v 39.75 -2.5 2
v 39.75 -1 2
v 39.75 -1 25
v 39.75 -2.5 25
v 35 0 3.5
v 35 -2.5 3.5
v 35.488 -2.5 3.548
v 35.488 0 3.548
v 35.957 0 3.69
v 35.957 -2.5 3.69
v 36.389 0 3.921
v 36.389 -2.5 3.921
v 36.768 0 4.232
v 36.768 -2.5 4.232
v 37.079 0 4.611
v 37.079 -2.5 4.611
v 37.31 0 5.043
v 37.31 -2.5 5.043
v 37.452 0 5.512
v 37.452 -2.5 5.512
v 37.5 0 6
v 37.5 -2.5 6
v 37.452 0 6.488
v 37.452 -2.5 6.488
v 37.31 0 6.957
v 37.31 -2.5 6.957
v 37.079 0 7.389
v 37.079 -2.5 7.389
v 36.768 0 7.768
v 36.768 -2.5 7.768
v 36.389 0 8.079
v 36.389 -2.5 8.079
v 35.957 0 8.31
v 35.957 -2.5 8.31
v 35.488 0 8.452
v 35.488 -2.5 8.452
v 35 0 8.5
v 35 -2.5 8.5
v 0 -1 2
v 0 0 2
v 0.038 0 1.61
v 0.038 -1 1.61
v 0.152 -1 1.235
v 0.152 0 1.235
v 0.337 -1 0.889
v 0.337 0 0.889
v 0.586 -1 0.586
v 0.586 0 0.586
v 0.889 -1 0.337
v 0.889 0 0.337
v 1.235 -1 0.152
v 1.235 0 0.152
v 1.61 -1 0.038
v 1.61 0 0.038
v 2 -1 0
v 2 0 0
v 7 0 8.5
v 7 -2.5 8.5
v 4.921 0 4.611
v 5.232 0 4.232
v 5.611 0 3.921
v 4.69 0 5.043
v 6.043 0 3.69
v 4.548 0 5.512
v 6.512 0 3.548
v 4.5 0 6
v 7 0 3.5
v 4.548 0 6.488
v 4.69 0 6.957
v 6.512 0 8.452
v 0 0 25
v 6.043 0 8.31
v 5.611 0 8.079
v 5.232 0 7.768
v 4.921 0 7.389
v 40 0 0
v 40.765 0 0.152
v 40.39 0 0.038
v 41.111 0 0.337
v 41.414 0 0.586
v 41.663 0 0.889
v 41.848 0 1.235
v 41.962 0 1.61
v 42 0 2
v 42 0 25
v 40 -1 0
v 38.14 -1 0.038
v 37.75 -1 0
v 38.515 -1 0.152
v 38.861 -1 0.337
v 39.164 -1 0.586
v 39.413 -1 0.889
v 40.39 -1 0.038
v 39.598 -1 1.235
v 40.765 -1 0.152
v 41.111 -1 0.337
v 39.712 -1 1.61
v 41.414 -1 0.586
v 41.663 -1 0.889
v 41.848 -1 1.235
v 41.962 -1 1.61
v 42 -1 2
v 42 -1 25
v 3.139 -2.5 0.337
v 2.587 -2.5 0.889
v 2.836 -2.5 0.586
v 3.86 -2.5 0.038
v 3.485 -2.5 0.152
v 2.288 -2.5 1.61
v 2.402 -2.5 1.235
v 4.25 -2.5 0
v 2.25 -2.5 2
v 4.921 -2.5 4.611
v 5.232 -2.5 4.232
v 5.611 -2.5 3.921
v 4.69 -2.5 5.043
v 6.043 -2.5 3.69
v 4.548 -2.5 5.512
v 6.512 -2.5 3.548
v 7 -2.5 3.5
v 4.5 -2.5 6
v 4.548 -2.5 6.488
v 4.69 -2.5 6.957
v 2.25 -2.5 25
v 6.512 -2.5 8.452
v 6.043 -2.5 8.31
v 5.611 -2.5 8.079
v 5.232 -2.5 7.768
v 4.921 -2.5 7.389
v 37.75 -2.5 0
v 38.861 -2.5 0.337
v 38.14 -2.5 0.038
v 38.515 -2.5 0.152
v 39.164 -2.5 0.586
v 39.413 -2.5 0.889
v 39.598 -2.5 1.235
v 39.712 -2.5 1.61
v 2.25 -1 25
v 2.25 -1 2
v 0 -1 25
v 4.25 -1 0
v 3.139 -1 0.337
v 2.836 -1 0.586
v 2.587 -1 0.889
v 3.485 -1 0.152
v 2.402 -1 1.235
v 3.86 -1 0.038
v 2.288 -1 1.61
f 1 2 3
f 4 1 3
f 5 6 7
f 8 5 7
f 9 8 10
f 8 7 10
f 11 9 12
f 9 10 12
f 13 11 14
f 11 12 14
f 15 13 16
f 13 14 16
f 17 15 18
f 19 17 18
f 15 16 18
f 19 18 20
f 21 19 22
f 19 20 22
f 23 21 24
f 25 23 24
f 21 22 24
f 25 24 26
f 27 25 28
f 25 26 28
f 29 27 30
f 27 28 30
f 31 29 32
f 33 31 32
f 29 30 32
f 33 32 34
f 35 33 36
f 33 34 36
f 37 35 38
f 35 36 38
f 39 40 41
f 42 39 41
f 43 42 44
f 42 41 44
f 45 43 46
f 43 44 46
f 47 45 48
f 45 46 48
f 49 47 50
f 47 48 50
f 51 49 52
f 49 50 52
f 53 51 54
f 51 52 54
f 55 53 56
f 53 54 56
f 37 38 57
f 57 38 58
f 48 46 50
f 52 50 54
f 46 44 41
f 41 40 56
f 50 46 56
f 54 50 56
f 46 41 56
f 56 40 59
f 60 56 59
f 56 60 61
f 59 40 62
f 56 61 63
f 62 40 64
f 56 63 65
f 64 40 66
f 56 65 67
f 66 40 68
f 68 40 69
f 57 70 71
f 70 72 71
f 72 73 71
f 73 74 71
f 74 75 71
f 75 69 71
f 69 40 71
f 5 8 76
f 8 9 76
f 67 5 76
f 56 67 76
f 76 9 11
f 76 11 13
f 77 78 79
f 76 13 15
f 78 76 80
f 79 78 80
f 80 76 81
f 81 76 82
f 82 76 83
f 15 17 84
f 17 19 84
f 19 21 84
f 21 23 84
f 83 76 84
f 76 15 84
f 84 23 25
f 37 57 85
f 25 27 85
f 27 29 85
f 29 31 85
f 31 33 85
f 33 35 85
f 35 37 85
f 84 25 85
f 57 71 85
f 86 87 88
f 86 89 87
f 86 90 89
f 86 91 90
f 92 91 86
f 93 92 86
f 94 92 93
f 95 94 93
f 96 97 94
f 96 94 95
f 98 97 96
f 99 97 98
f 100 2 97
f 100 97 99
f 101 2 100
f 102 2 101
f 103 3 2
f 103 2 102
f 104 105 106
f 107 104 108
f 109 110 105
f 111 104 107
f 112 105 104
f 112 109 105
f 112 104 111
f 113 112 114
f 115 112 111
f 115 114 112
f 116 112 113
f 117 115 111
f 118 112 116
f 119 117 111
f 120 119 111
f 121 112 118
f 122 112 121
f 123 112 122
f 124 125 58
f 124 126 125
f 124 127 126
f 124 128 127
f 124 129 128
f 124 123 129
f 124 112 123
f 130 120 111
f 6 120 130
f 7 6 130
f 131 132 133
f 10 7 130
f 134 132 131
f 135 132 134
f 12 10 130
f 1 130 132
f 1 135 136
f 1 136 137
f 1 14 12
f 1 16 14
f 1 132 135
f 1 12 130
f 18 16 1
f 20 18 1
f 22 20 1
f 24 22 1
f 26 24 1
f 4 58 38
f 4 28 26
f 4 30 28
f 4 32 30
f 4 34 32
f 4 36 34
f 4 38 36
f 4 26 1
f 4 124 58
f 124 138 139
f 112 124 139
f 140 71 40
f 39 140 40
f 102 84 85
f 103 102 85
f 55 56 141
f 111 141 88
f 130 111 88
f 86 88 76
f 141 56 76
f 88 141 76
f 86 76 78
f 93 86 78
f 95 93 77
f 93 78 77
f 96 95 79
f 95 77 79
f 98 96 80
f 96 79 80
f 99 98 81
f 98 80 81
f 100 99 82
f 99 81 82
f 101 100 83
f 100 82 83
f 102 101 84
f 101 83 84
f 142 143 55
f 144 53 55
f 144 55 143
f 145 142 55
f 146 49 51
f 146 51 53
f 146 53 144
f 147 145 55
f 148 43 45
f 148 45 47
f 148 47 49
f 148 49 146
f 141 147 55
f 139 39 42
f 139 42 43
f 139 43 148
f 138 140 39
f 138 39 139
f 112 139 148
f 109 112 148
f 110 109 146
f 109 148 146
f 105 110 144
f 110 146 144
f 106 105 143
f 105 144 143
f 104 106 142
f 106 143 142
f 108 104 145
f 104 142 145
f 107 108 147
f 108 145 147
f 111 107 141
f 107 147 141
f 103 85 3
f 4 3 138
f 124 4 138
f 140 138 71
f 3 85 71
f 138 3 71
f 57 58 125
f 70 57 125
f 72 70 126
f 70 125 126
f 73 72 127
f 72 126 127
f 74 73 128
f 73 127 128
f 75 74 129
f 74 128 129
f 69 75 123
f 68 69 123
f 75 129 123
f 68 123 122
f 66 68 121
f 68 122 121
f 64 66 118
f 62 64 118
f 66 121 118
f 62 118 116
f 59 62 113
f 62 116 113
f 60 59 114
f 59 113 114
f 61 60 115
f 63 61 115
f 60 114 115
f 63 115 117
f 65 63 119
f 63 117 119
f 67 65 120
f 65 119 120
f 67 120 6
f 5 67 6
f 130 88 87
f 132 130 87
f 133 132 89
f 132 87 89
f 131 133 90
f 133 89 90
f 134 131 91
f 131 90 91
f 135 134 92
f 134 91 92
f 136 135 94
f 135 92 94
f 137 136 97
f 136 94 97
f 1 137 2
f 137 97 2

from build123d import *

# Parameters (mm, degrees)
F1_DEPTH = 1
F3_DEPTH = 1.5
F5_DEPTH = 2.5


with BuildPart() as f1:
    # F0 (on Front) → F1 (new body)
    with BuildSketch(Plane.XZ):
        with BuildLine():
            ThreePointArc((0, 2), (0.5857864376, 0.5857864376), (2, 0))
            Line((2, 0), (40, 0))
            ThreePointArc((40, 0), (41.4142135624, 0.5857864376), (42, 2))
            Line((42, 2), (42, 25))
            Line((42, 25), (0, 25))
            Line((0, 25), (0, 2))
        make_face()
    extrude(amount=F1_DEPTH)

    # F2 (on face) → F3 (join)
    with BuildSketch(Plane.XZ.offset(1)):
        with BuildLine():
            Line((39.75, 25), (2.25, 25))
            Line((2.25, 25), (2.25, 2))
            ThreePointArc((2.25, 2), (2.8357864376, 0.5857864376), (4.25, 0))
            Line((4.25, 0), (37.75, 0))
            ThreePointArc((37.75, 0), (39.1642135624, 0.5857864376), (39.75, 2))
            Line((39.75, 2), (39.75, 25))
        make_face()
    extrude(amount=F3_DEPTH)

    # F4 (on face) → F5 (cut, through all)
    with BuildSketch(Plane.XZ.offset(2.5)):
        with BuildLine():
            Line((35, 8.5), (7, 8.5))
            ThreePointArc((7, 8.5), (4.5, 6), (7, 3.5))
            Line((7, 3.5), (35, 3.5))
            ThreePointArc((35, 3.5), (37.5, 6), (35, 8.5))
        make_face()
    extrude(amount=-F5_DEPTH, mode=Mode.SUBTRACT)


solid = f1.part
